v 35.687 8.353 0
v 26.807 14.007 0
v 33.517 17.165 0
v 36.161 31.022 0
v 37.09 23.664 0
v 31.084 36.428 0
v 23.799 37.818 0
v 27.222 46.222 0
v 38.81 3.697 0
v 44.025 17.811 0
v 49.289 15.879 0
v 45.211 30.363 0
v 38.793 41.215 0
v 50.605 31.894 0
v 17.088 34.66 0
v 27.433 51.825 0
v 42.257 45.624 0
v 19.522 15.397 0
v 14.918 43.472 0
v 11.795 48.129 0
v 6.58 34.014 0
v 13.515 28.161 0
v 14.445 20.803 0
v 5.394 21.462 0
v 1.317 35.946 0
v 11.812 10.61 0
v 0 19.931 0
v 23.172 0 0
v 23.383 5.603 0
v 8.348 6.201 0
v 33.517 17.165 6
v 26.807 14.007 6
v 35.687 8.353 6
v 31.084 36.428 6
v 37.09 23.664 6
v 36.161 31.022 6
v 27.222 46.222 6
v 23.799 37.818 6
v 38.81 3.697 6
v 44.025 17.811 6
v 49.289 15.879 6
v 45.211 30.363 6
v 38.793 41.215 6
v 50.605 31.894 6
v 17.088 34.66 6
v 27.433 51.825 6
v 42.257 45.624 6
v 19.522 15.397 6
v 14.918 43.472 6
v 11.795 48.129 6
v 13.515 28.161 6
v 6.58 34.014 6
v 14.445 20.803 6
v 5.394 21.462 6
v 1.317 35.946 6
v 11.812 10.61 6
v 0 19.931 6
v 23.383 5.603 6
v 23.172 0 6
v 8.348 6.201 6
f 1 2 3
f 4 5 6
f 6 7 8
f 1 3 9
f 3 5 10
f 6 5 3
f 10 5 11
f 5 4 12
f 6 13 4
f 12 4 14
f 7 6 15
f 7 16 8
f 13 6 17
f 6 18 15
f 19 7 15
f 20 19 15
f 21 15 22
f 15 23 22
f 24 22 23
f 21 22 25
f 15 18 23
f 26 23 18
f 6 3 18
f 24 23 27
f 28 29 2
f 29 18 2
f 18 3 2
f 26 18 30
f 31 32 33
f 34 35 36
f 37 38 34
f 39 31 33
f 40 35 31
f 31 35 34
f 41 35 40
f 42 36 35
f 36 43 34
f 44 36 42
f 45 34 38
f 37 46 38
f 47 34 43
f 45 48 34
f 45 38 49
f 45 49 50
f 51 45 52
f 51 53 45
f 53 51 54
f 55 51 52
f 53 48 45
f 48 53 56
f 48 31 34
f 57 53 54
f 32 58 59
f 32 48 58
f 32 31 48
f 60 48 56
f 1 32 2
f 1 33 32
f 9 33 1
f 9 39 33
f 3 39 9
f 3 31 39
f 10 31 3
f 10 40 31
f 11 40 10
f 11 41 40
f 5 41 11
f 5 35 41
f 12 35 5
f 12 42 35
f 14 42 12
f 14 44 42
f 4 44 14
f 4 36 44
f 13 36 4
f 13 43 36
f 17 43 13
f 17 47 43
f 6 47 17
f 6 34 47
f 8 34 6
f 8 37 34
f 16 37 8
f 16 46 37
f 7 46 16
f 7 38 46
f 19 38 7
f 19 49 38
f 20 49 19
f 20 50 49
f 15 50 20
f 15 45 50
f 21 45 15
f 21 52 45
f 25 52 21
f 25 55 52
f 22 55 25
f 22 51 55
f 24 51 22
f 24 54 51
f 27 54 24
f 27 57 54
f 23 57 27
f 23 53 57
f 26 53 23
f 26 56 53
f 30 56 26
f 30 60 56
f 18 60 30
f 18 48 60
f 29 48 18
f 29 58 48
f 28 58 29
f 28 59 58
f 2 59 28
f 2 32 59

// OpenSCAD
$fn = 32;

// ----------------------------------------------------------------------
// Fan rotor section: 10 blades, 12 mm hub radius, 14 mm blades
// ----------------------------------------------------------------------

// --- parameters (mm) ---
profile_height = 6;       // extrusion height
profile_points = 30;      // points of the closed outline

profile = [[37.09, 23.664], [45.211, 30.363], [50.605, 31.894], [36.161, 31.022], [38.793, 41.215], [42.257, 45.624], [31.084, 36.428], [27.222, 46.222], [27.433, 51.825], [23.799, 37.818], [14.918, 43.472], [11.795, 48.129], [17.088, 34.66], [6.58, 34.014], [1.317, 35.946], [13.515, 28.161], [5.394, 21.462], [0, 19.931], [14.445, 20.803], [11.812, 10.61], [8.348, 6.201], [19.522, 15.397], [23.383, 5.603], [23.172, 0], [26.807, 14.007], [35.687, 8.353], [38.81, 3.697], [33.517, 17.165], [44.025, 17.811], [49.289, 15.879]];  // single closed polygon, 30 points, counter clockwise

// --- the one profile operation ---
linear_extrude(height = profile_height) polygon(points = profile);
